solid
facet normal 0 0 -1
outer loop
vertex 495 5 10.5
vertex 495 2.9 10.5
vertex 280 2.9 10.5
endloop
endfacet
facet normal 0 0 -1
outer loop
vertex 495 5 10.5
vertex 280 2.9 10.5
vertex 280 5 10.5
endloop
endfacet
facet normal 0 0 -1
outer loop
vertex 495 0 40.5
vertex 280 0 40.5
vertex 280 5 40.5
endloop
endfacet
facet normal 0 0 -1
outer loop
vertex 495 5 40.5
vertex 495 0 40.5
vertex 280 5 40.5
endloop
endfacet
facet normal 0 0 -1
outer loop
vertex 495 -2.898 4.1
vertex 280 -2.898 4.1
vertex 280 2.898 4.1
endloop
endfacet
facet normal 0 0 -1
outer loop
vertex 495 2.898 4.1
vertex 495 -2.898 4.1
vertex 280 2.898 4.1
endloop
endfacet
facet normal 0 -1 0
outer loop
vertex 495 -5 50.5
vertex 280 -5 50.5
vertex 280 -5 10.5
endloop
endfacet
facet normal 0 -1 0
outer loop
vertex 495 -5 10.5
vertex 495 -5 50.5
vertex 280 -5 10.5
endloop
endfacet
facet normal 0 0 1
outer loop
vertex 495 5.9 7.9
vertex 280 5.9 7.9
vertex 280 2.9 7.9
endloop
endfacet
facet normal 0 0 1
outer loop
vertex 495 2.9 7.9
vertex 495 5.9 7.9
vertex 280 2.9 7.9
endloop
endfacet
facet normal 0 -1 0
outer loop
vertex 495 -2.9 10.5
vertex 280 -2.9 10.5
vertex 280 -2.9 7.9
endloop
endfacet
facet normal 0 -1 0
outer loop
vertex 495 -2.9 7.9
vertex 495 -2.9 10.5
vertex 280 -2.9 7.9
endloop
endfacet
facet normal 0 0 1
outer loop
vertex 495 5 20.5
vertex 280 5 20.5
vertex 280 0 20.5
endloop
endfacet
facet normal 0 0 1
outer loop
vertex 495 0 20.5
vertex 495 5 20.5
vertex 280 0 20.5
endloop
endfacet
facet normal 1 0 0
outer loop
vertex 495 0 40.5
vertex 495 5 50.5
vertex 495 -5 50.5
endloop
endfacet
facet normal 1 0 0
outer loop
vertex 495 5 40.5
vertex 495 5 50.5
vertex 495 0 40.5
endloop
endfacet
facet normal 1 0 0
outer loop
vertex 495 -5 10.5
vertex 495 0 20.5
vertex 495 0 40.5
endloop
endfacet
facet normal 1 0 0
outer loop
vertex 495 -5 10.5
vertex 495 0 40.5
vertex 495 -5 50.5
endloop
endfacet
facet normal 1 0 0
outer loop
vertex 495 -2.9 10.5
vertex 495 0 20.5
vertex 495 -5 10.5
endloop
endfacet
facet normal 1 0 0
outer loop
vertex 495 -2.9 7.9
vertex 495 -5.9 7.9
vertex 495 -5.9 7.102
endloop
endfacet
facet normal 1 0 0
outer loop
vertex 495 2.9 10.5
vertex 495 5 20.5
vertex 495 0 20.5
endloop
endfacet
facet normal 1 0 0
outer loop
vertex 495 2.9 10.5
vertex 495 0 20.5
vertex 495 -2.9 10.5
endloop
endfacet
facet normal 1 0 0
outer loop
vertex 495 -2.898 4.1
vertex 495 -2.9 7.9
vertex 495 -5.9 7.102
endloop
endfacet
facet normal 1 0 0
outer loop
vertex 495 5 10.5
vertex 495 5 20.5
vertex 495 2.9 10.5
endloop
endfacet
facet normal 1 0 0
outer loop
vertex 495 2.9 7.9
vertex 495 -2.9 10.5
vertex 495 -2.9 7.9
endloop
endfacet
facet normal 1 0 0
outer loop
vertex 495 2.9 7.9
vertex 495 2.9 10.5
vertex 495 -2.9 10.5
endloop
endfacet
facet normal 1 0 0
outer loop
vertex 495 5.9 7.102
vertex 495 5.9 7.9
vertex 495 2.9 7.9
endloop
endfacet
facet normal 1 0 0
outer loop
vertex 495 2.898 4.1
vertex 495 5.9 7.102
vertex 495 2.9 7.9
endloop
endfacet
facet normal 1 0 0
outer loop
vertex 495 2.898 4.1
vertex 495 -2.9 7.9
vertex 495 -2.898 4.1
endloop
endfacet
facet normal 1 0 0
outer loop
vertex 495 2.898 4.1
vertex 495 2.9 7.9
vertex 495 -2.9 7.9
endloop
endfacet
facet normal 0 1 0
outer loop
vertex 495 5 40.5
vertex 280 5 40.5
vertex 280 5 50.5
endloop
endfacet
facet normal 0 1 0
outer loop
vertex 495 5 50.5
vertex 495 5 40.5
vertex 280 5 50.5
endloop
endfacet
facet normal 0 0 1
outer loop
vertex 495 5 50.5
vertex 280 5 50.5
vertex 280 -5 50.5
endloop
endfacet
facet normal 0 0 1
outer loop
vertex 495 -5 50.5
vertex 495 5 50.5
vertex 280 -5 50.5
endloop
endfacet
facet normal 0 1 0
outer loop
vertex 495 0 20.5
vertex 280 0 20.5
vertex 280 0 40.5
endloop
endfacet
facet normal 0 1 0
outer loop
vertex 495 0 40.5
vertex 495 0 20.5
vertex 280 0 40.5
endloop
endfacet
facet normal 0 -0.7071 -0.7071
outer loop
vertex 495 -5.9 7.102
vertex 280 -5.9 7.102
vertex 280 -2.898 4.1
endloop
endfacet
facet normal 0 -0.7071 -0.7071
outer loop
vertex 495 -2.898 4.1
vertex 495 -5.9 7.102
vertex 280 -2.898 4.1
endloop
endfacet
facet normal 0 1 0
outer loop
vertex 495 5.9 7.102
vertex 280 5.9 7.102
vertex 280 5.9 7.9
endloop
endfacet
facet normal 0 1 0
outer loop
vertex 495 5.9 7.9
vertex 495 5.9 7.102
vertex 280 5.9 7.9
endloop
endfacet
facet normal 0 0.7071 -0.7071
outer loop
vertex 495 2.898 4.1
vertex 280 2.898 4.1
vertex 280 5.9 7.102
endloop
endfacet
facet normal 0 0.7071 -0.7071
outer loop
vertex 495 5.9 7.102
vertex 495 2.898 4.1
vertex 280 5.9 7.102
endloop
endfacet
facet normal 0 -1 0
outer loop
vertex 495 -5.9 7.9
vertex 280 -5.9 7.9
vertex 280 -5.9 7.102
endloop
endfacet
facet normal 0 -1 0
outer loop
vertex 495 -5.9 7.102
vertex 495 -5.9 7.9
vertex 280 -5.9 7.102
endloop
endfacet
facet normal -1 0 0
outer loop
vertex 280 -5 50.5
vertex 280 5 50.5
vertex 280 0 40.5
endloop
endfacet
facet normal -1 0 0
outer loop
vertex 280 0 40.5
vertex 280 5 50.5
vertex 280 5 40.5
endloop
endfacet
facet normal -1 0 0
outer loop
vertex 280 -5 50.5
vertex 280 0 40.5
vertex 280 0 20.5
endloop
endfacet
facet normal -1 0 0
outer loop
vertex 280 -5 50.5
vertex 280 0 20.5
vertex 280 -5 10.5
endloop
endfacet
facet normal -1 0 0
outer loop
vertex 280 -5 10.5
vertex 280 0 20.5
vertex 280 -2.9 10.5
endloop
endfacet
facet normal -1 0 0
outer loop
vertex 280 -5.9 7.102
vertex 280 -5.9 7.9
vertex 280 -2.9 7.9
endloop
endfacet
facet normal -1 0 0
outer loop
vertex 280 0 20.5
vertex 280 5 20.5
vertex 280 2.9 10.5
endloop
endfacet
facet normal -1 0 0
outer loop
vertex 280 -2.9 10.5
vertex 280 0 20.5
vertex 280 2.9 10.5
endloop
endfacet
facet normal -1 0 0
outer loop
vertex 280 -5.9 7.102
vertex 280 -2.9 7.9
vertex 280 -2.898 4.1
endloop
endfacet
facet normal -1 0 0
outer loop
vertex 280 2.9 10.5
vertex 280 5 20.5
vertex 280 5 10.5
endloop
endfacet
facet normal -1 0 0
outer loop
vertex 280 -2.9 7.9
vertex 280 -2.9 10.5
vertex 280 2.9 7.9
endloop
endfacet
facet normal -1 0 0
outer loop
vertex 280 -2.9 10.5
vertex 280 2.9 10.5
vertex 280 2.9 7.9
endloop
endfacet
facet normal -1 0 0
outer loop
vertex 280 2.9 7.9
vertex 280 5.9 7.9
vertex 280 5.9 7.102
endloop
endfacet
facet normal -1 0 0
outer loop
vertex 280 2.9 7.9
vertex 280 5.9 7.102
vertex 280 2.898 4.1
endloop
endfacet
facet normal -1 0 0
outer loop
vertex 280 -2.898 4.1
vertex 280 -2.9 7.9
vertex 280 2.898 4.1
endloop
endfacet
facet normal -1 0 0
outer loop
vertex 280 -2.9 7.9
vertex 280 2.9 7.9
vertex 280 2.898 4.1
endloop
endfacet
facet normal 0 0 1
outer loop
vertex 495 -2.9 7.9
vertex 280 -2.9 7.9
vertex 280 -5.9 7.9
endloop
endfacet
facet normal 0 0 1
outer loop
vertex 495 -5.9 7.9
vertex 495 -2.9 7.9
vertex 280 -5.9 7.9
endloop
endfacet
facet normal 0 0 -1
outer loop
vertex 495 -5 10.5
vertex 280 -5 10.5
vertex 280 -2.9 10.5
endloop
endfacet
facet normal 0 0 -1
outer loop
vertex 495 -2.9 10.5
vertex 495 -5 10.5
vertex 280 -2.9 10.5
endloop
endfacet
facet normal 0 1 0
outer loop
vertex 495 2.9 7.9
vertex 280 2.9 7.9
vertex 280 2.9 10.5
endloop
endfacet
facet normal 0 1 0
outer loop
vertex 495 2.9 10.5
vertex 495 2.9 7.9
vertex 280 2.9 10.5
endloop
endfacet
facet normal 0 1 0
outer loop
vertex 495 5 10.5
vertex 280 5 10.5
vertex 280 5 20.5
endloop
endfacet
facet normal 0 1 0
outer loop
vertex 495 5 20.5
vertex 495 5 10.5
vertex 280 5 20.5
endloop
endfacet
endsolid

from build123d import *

# Parameters (mm, degrees)
SKETCH1_R           = 2.1
BOSS_EXTRUDE1_DEPTH = 65
SKETCH84_W          = 0.3
SKETCH84_H          = 5.4
BOSS_EXTRUDE6_DEPTH = 430
SKETCH85_W          = 26.589814492
SKETCH85_H          = 26.977421118
CUT_EXTRUDE59_DEPTH = 434.070721707
SKETCH86_W          = 10.5
SKETCH86_H          = 16.670499862
CUT_EXTRUDE60_DEPTH = 20
SKETCH87_W          = 62.679537103
SKETCH87_H          = 29.503453987
CUT_EXTRUDE61_DEPTH = 215
BOSS_EXTRUDE7_DEPTH = 215


with BuildPart() as part:
    # Sketch1 → Boss-Extrude1 (new body)
    with BuildSketch(Plane(origin=(0, 0, 0), x_dir=(0, 0, -1), z_dir=(1, 0, 0))):
        with BuildLine():
            Line((-10, 9), (-10, 3))
            Line((-10, 3), (-8, 3))
            Line((-8, 3), (-8, 6))
            Line((-8, 6), (-7.060660172, 6))
            Line((-7.060660172, 6), (-4, 2.939339828))
            Line((-4, 2.939339828), (-4, -2.939339828))
            Line((-4, -2.939339828), (-7.060660172, -6))
            Line((-7.060660172, -6), (-8, -6))
            Line((-8, -6), (-8, -3))
            Line((-8, -3), (-10, -3))
            Line((-10, -3), (-10, -9))
            ThreePointArc((-10, -9), (-9.707106781, -9.707106781), (-9, -10))
            Line((-9, -10), (-3, -10))
            Line((-3, -10), (-3, -8))
            Line((-3, -8), (-6, -8))
            Line((-6, -8), (-6, -7.060660172))
            Line((-6, -7.060660172), (-2.939339828, -4))
            Line((-2.939339828, -4), (2.939339828, -4))
            Line((2.939339828, -4), (6, -7.060660172))
            Line((6, -7.060660172), (6, -8))
            Line((6, -8), (3, -8))
            Line((3, -8), (3, -10))
            Line((3, -10), (9, -10))
            ThreePointArc((9, -10), (9.707106781, -9.707106781), (10, -9))
            Line((10, -9), (10, -3))
            Line((10, -3), (8, -3))
            Line((8, -3), (8, -6))
            Line((8, -6), (7.060660172, -6))
            Line((7.060660172, -6), (4, -2.939339828))
            Line((4, -2.939339828), (4, 2.939339828))
            Line((4, 2.939339828), (7.060660172, 6))
            Line((7.060660172, 6), (8, 6))
            Line((8, 6), (8, 3))
            Line((8, 3), (10, 3))
            Line((10, 3), (10, 9))
            ThreePointArc((10, 9), (9.707106781, 9.707106781), (9, 10))
            Line((9, 10), (3, 10))
            Line((3, 10), (3, 8))
            Line((3, 8), (6, 8))
            Line((6, 8), (6, 7.060660172))
            Line((6, 7.060660172), (2.939339828, 4))
            Line((2.939339828, 4), (-2.939339828, 4))
            Line((-2.939339828, 4), (-6, 7.060660172))
            Line((-6, 7.060660172), (-6, 8))
            Line((-6, 8), (-3, 8))
            Line((-3, 8), (-3, 10))
            Line((-3, 10), (-9, 10))
            ThreePointArc((-9, 10), (-9.707106781, 9.707106781), (-10, 9))
        make_face()
        Circle(SKETCH1_R, mode=Mode.SUBTRACT)
    extrude(amount=BOSS_EXTRUDE1_DEPTH)

    # Sketch85 → Cut-Extrude59 (cut, through all)
    with BuildSketch(Plane(origin=(65, 0, 0), x_dir=(0, 0, -1), z_dir=(1, 0, 0))):
        with Locations((1.176321583, -0.814927094)):
            Rectangle(SKETCH85_W, SKETCH85_H)
    extrude(amount=-CUT_EXTRUDE59_DEPTH, mode=Mode.SUBTRACT)


with BuildPart() as body_2:
    # Sketch84 → Boss-Extrude6 (new body)
    with BuildSketch(Plane(origin=(65, 0, 0), x_dir=(0, 0, -1), z_dir=(1, 0, 0))):
        Polygon((-10, -2.7), (-10, 2.7), (-10.5, 2.7), (-10.5, 5), (-20.5, 5), (-20.5, 0), (-40.5, 0), (-40.5, 5), (-50.5, 5), (-50.5, -5), (-10.5, -5), (-10.5, -2.7), align=None)
        Polygon((-7.18492424, 5.7), (-4.3, 2.81507576), (-4.3, -2.81507576), (-7.18492424, -5.7), (-7.7, -5.7), (-7.7, -2.7), (-9.7, -2.7), (-9.7, 2.7), (-7.7, 2.7), (-7.7, 5.7), align=None)
        with Locations((-9.85, 0)):
            Rectangle(SKETCH84_W, SKETCH84_H)
    extrude(amount=BOSS_EXTRUDE6_DEPTH)

    # Sketch86 → Cut-Extrude60 (cut)
    with BuildSketch(Plane.ZY.offset(-65)):
        with Locations((5.25, -0.117074477)):
            Rectangle(SKETCH86_W, SKETCH86_H)
    extrude(amount=-CUT_EXTRUDE60_DEPTH, mode=Mode.SUBTRACT)

    # Sketch87 → Cut-Extrude61 (cut)
    with BuildSketch(Plane.ZY.offset(-65)):
        with Locations((27.544038236, 0.275447184)):
            Rectangle(SKETCH87_W, SKETCH87_H)
    extrude(amount=-CUT_EXTRUDE61_DEPTH, mode=Mode.SUBTRACT)

    # Sketch88 → Boss-Extrude7 (add)
    with BuildSketch(Plane.ZY.offset(-280)):
        Polygon((10.7, 2.9), (10.7, -2.9), (7.9, -2.9), (7.9, -5.9), (7.102081528, -5.9), (4.1, -2.897918472), (4.1, 2.897918472), (7.102081528, 5.9), (7.9, 5.9), (7.9, 2.9), align=None)
        Polygon((10.5, 2.7), (10.5, -2.7), (7.7, -2.7), (7.7, -5.7), (7.18492424, -5.7), (4.3, -2.81507576), (4.3, 2.81507576), (7.18492424, 5.7), (7.7, 5.7), (7.7, 2.7), align=None, mode=Mode.SUBTRACT)
    extrude(amount=-BOSS_EXTRUDE7_DEPTH)


solid = body_2.part
